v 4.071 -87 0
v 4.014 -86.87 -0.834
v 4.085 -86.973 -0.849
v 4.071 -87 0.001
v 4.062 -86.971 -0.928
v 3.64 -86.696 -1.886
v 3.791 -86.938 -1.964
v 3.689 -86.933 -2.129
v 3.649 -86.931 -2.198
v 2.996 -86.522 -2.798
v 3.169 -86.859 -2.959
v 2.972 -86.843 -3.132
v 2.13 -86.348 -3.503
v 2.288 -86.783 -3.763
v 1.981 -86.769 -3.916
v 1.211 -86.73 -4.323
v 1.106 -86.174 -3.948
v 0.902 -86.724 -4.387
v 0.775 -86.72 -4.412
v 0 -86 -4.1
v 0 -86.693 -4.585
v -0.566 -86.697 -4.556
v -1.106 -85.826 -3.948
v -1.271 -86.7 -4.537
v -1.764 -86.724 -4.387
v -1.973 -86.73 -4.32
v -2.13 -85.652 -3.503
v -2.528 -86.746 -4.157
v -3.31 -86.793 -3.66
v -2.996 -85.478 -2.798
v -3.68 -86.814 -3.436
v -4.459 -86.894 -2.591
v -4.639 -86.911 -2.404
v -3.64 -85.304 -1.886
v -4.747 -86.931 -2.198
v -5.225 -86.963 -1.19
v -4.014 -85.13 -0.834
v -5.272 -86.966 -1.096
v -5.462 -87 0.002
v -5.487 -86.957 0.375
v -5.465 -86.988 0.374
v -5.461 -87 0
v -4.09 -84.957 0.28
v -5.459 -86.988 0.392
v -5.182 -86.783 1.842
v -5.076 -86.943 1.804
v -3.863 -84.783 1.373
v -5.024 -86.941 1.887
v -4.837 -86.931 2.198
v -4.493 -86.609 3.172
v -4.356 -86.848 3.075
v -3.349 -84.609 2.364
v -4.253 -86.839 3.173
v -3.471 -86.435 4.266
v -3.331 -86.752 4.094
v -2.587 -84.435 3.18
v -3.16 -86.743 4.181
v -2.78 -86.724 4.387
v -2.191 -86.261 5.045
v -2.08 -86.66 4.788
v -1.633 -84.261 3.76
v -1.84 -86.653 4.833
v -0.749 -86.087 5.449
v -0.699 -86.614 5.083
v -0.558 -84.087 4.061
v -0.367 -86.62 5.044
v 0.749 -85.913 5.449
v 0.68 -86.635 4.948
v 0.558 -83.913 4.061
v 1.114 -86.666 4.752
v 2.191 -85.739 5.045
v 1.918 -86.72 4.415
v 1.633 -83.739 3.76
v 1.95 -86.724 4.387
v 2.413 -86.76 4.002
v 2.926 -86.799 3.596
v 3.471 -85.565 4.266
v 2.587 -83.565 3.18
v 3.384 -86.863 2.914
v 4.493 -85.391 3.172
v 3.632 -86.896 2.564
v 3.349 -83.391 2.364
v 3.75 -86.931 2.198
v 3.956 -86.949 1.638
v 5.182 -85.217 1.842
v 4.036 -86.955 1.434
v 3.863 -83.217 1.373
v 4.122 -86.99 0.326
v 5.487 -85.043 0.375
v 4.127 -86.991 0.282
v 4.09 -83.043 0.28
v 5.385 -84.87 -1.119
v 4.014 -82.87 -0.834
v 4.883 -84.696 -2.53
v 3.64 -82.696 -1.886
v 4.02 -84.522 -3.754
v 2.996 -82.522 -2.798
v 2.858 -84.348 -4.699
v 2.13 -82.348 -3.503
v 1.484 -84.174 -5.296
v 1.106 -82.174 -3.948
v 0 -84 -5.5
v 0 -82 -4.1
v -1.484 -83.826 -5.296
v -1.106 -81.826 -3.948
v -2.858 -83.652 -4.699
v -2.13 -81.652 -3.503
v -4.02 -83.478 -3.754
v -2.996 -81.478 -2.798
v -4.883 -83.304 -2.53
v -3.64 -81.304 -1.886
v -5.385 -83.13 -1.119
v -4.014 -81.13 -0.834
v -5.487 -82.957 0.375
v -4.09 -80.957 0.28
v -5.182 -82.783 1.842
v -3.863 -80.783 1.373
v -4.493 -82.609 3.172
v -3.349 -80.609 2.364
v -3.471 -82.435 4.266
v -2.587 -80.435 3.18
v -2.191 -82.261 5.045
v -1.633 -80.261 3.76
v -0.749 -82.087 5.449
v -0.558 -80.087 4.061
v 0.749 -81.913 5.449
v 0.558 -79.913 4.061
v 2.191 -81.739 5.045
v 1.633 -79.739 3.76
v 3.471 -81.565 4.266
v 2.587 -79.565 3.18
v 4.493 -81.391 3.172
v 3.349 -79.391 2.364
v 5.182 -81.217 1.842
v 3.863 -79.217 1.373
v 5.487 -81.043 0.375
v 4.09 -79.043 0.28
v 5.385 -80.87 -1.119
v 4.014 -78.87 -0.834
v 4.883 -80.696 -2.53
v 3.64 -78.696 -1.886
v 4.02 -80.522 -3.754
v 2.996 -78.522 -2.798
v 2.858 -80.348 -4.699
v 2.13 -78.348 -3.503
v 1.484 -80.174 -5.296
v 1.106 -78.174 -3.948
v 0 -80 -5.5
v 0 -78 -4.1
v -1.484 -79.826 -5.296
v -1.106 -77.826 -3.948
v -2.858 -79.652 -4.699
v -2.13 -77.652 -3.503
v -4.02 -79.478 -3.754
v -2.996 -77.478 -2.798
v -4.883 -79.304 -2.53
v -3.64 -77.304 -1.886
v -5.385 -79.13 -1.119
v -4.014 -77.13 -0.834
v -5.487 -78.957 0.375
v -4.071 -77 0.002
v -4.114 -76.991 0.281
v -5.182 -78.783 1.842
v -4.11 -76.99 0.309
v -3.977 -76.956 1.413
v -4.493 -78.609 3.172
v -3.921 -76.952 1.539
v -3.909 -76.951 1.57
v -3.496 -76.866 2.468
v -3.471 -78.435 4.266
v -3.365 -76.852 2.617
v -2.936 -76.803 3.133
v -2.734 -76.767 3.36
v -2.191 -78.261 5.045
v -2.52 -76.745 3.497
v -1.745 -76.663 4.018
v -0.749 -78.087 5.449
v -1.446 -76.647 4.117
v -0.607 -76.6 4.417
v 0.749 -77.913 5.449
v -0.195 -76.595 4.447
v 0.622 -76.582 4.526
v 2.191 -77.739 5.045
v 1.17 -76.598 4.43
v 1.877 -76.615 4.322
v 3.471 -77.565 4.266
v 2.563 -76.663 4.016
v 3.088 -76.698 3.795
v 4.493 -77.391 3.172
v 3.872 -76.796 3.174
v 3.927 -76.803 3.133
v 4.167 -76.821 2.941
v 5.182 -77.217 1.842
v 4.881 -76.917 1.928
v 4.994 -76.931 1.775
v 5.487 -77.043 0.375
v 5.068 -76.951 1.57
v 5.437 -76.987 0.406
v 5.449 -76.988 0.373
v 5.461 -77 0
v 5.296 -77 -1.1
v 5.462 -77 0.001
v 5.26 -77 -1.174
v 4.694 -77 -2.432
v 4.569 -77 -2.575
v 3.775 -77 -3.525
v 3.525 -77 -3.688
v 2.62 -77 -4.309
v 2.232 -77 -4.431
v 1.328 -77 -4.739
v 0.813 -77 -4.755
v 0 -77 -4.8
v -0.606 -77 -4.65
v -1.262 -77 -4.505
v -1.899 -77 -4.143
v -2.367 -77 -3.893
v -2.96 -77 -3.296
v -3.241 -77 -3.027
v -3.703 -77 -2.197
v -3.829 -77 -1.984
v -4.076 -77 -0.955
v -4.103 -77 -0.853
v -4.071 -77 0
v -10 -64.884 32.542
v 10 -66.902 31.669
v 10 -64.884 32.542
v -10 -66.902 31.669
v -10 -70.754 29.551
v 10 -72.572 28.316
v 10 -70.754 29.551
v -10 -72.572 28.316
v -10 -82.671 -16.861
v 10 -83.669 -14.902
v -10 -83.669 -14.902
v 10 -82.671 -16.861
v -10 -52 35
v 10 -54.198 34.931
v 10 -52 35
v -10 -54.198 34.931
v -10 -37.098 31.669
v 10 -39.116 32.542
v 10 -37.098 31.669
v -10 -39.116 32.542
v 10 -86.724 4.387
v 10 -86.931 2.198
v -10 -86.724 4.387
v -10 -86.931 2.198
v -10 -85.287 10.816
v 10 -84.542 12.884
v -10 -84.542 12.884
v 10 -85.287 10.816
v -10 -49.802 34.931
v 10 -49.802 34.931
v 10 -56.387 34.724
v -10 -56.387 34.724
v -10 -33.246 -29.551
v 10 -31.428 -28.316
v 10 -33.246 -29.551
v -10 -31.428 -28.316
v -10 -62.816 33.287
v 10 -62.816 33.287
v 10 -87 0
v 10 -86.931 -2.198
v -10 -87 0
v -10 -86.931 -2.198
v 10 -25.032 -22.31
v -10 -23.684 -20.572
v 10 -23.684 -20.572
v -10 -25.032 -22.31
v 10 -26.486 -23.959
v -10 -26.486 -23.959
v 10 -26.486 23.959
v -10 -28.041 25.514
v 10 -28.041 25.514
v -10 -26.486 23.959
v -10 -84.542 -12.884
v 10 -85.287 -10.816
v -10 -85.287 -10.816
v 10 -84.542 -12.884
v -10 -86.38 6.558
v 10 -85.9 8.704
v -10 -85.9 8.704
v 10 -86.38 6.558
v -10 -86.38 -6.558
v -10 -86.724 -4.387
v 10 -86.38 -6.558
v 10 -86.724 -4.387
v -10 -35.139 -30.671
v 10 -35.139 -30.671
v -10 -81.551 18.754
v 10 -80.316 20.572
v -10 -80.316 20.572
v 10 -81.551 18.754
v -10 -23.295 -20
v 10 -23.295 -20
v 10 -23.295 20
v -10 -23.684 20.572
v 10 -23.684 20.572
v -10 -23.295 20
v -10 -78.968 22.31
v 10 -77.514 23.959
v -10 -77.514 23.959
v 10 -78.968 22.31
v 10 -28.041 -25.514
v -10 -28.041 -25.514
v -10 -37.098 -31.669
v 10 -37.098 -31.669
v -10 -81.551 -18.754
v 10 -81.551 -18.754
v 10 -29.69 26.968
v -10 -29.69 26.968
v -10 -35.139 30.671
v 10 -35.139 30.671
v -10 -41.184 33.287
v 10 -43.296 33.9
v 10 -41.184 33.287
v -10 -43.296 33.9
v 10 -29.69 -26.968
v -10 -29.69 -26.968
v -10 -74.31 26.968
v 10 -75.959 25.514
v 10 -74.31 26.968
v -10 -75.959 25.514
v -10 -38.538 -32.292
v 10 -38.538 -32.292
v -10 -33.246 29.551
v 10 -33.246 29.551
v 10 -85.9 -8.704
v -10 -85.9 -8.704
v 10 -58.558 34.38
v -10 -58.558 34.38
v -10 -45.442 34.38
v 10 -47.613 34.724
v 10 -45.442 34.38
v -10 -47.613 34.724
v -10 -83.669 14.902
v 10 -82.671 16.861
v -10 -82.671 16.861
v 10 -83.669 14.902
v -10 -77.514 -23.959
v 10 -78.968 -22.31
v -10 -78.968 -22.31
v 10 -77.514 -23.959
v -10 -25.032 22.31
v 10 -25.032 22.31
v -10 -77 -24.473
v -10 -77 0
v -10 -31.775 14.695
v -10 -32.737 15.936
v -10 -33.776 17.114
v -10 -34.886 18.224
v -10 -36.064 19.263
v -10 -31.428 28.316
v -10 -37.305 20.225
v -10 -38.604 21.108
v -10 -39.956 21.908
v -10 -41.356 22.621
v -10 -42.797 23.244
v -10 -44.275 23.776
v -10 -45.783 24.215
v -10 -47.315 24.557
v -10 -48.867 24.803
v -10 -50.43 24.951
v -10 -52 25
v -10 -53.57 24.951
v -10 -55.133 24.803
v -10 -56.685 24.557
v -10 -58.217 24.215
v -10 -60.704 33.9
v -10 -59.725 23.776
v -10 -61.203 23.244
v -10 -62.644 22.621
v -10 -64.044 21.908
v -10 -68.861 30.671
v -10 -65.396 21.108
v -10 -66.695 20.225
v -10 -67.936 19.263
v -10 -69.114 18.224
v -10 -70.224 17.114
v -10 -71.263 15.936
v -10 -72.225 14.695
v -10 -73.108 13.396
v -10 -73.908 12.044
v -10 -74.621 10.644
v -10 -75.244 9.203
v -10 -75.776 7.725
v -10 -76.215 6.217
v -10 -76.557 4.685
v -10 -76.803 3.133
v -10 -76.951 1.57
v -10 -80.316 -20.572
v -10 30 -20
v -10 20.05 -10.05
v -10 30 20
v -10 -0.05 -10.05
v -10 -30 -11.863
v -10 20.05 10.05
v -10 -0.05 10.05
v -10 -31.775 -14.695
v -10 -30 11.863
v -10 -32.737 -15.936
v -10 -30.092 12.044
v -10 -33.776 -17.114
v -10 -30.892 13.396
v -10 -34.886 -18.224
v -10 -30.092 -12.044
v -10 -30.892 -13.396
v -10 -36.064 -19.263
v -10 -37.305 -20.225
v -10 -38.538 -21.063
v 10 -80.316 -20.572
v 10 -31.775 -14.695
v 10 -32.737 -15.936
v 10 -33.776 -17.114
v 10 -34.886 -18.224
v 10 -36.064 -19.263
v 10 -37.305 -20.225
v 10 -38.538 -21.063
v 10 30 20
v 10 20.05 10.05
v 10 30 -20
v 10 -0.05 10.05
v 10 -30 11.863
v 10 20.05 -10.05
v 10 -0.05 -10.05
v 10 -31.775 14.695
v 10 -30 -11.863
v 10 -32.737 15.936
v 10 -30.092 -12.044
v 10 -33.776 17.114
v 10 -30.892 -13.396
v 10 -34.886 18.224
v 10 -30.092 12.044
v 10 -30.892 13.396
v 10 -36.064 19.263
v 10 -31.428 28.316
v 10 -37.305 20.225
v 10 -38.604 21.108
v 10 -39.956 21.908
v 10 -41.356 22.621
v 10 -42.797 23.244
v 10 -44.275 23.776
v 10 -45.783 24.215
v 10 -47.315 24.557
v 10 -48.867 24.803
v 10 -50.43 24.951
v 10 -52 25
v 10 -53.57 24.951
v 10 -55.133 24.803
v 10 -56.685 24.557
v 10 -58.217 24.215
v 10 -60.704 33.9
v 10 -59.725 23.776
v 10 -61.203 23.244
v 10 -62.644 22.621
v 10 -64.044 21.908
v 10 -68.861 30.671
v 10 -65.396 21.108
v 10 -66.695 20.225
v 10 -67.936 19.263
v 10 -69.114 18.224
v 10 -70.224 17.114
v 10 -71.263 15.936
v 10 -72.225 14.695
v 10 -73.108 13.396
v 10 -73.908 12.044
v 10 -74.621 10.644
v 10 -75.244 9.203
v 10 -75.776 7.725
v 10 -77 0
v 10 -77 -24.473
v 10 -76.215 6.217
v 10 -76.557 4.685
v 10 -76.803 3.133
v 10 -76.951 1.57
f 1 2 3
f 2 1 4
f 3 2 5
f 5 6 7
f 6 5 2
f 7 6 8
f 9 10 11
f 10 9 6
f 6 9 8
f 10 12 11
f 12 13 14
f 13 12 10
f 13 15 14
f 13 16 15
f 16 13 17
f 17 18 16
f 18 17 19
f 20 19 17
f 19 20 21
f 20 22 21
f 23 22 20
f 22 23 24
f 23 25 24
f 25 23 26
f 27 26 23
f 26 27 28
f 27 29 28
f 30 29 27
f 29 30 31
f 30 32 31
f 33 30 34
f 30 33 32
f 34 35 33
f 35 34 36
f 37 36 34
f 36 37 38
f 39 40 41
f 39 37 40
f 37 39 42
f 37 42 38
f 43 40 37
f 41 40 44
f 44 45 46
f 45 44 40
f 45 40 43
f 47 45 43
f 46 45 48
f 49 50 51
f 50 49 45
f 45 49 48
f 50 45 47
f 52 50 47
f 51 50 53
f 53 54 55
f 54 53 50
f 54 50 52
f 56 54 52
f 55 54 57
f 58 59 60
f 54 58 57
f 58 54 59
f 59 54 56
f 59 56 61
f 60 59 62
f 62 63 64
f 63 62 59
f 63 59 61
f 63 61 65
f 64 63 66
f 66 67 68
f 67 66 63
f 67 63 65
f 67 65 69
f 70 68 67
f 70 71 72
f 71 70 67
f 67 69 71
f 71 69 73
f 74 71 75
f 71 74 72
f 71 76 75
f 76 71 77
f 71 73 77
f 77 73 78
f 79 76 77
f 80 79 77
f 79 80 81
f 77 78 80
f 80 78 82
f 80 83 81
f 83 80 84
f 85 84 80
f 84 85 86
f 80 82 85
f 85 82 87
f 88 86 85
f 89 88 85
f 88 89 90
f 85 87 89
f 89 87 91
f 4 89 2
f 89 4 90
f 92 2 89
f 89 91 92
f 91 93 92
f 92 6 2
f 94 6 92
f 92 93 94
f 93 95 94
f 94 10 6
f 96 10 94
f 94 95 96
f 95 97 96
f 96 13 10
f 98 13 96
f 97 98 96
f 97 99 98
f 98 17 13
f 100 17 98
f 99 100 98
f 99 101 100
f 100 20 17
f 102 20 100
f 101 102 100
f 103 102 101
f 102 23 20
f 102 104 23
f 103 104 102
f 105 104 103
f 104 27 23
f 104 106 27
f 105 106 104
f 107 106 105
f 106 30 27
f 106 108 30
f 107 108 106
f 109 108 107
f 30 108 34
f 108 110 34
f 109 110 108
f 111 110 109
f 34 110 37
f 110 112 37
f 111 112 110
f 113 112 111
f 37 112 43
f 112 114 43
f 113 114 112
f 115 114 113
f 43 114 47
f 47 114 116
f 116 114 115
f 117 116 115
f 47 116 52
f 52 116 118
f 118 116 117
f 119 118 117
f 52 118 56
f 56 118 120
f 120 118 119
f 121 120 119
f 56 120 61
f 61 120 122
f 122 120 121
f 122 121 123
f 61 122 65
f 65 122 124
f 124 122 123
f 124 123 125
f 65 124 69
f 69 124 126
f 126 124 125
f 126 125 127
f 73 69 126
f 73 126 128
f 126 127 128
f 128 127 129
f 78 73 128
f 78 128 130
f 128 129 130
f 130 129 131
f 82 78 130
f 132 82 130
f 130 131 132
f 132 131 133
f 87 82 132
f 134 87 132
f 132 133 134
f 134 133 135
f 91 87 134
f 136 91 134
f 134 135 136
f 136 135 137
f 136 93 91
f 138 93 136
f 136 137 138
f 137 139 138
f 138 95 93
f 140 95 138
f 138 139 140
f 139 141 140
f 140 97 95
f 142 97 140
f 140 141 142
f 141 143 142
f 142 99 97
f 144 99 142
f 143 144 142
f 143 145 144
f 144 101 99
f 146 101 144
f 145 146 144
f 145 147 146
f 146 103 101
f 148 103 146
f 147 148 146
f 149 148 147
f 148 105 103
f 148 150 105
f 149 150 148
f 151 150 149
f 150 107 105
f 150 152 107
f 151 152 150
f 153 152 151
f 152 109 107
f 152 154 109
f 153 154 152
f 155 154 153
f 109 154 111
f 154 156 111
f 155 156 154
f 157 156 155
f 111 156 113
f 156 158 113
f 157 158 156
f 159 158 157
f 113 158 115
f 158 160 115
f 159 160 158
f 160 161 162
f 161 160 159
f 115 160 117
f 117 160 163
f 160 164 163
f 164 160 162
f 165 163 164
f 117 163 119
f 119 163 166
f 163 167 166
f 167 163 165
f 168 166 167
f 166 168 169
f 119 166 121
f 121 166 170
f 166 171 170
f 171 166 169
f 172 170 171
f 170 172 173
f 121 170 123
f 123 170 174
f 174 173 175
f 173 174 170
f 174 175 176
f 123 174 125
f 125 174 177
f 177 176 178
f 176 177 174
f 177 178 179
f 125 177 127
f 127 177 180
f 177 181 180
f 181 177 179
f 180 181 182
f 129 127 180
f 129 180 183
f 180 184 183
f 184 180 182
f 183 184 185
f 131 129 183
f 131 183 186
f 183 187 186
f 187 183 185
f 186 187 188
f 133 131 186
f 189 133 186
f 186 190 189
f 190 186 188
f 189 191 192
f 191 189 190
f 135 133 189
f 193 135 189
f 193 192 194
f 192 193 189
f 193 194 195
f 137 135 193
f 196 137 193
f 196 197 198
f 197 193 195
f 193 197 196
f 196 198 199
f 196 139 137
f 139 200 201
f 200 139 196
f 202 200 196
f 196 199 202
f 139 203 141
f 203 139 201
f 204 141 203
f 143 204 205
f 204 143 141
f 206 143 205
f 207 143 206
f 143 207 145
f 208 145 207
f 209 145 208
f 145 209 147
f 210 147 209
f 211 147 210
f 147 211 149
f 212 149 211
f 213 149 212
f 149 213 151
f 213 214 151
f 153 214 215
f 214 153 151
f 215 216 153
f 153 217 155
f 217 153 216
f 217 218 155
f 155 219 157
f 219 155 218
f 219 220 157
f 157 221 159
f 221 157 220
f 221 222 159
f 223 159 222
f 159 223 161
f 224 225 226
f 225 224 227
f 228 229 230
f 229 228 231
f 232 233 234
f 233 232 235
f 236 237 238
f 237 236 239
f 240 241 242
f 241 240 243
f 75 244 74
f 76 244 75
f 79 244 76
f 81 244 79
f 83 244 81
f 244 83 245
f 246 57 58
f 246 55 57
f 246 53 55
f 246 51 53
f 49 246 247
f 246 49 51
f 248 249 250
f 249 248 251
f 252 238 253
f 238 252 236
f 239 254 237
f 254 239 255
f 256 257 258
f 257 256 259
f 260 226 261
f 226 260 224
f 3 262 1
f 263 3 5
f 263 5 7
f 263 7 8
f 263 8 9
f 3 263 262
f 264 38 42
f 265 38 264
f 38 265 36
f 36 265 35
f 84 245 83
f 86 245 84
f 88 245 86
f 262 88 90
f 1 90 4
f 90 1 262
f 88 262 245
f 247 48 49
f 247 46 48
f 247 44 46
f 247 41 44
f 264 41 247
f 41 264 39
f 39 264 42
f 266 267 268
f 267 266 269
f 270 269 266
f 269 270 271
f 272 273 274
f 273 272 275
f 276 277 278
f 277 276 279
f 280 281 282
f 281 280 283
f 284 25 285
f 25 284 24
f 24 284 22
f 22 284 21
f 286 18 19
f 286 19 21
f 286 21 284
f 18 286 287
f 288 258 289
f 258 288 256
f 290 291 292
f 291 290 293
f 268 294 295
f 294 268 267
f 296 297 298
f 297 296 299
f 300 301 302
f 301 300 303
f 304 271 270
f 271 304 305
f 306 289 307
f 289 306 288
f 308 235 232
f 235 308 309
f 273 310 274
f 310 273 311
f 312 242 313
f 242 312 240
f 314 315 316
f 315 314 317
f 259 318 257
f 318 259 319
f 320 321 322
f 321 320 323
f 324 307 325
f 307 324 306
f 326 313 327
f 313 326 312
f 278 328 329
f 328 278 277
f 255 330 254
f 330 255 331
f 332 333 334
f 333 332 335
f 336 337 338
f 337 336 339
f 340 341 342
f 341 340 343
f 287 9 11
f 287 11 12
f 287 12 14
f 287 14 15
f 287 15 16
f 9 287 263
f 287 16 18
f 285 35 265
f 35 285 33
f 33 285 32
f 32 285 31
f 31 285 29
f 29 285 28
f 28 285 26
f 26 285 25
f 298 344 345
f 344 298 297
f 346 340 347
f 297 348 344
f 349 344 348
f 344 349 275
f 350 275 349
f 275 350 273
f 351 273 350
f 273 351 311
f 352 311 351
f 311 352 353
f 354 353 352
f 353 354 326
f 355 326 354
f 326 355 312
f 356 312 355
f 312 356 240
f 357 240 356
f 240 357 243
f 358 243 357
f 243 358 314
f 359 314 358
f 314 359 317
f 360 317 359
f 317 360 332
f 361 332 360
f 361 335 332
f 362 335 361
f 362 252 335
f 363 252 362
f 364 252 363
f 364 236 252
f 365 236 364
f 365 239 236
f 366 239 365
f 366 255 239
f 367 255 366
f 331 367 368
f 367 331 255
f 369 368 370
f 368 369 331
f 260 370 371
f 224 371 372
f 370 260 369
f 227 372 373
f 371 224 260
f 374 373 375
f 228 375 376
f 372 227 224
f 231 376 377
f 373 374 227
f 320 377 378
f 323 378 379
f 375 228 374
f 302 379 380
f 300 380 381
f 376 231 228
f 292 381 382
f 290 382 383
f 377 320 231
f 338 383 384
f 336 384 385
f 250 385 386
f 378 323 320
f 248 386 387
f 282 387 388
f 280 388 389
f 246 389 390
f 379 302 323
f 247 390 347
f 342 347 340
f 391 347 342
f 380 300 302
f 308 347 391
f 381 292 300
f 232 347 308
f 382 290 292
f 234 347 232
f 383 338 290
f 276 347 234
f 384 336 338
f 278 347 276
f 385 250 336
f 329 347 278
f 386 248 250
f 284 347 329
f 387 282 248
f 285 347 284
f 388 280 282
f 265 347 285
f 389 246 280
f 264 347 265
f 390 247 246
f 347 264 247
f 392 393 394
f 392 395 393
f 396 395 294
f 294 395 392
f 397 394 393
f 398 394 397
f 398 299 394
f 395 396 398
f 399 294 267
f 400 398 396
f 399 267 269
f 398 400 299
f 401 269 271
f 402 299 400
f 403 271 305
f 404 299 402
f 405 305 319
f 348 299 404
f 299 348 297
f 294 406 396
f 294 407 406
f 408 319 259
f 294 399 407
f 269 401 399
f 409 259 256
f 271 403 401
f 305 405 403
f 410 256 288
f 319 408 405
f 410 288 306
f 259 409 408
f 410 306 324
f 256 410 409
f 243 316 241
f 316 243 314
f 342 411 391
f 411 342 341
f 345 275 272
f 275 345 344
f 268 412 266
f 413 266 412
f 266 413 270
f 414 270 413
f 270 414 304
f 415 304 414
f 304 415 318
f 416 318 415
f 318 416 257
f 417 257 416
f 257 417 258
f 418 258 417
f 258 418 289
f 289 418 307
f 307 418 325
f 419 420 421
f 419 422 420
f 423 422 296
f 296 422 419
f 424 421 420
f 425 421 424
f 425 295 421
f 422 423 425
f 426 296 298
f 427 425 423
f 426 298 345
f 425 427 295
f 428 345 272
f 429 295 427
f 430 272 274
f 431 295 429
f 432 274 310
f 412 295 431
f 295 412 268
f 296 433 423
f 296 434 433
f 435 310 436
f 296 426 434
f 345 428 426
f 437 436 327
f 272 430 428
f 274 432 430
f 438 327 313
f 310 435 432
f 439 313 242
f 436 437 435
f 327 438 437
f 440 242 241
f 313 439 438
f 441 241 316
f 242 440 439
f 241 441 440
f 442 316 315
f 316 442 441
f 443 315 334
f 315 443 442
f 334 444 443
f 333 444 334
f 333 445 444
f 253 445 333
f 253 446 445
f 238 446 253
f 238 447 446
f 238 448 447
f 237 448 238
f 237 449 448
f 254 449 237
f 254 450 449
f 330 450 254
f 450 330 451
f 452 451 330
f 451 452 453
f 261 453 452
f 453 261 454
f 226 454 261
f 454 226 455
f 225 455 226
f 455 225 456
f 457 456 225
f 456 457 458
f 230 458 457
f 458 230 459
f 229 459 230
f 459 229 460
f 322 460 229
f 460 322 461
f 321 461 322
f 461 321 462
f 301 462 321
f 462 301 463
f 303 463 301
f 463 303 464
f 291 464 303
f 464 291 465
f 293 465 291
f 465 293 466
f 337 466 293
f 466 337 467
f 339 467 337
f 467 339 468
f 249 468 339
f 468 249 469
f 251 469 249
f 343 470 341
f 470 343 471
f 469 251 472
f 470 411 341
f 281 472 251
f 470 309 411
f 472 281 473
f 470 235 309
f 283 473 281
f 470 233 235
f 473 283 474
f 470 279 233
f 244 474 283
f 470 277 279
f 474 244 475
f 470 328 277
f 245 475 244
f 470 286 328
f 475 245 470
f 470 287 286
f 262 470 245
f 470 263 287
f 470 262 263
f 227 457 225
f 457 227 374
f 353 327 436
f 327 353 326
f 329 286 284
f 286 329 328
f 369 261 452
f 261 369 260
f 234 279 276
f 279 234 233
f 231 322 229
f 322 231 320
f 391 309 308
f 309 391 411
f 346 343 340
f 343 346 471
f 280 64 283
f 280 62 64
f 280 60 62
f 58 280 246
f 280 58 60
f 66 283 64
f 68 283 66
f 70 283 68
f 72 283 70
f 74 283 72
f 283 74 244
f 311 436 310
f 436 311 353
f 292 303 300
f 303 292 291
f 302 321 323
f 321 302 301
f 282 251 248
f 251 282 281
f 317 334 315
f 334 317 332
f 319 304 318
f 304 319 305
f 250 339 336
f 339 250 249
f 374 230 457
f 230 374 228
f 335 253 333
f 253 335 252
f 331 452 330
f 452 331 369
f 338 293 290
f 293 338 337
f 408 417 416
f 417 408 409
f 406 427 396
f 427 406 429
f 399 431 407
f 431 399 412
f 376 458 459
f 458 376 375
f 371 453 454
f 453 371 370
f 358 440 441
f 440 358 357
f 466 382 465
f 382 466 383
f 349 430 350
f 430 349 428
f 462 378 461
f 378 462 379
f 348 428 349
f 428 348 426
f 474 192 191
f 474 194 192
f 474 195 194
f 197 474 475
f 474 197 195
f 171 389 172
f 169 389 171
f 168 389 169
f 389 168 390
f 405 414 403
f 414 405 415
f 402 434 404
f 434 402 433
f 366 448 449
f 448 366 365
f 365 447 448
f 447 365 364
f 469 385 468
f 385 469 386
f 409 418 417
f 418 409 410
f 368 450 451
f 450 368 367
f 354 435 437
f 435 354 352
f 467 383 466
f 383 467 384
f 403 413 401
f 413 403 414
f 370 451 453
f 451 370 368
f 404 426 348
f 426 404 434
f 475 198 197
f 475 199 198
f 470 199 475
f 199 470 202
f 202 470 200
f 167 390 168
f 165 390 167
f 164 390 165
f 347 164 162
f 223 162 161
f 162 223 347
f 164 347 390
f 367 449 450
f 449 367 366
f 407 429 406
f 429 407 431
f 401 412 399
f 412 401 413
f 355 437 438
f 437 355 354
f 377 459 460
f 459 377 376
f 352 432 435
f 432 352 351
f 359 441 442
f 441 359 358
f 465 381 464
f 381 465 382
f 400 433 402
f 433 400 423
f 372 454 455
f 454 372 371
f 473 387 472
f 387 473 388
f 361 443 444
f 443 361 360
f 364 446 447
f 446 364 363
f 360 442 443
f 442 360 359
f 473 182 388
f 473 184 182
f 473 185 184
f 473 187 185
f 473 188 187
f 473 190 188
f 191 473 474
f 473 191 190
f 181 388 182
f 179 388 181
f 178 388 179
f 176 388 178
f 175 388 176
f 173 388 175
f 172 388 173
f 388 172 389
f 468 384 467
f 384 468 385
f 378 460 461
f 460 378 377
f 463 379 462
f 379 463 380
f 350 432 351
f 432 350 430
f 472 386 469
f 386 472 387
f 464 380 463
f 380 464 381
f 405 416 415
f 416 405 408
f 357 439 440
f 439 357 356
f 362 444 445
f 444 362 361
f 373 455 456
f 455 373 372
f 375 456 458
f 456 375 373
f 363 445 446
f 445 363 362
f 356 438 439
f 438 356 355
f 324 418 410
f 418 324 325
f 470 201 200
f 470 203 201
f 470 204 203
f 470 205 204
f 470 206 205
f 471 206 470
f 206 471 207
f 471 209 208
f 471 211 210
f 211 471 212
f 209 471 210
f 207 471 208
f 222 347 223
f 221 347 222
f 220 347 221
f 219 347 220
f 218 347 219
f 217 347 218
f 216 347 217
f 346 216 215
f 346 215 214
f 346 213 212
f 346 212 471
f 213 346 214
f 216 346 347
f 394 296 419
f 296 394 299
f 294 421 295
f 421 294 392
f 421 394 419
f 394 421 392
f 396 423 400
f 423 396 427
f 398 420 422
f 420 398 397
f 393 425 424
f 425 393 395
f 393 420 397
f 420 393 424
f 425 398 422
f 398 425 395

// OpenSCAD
// file: nutsnbolts/data-access.scad
// Norm Nuts and Bolts - a OpenSCAD library
// Copyright (C) 2012  Johannes Kneer

// This program is free software: you can redistribute it and/or modify
// it under the terms of the GNU General Public License as published by
// the Free Software Foundation, either version 3 of the License, or
// (at your option) any later version.

// This program is distributed in the hope that it will be useful,
// but WITHOUT ANY WARRANTY; without even the implied warranty of
// MERCHANTABILITY or FITNESS FOR A PARTICULAR PURPOSE.  See the
// GNU General Public License for more details.

// You should have received a copy of the GNU General Public License
// along with this program.  If not, see <http://www.gnu.org/licenses/>.


// DATABASE ACCESS FUNCTIONS AND CONSTANTS



// == CONSTANTS ==

// screw table access keys
_NB_S_DESC            = 0;
_NB_S_FAMKEY			    = 1;
_NB_S_LENGTH          = 2;
_NB_S_NOTHREAD_LENGTH = 3;

_NB_F_DESC			      = 0;
_NB_F_OUTER_DIA       = 1;
_NB_F_INNER_DIA       = 2;
_NB_F_LEAD            = 3;
_NB_F_KEY             = 4;
_NB_F_KEY_DEPTH       = 5;
_NB_F_HEAD_HEIGHT     = 6;
_NB_F_HEAD_DIA        = 7;
_NB_F_NUT_KEY         = 8;
_NB_F_NUT_HEIGHT      = 9;
_NB_F_PITCH_FINE      = 10;
_NB_F_PITCH_MEDIUM    = 11;
_NB_F_PITCH_COARSE    = 12;


// == FUNCTIONS ==

// _get_screw("descriptor")   with descriptor = M8x25
//   find the line for a general object in the data matrix

function _get_screw(n) = data_screw[search([n], data_screw)[0]];
function _get_screw_fam(n) = data_screw_fam[search([_get_screw(n)[_NB_S_FAMKEY]], data_screw_fam)[0]];

function _get_fam(n) = data_screw_fam[search([n], data_screw_fam)[0]];


// _get_XXXXX("descriptor") functions
// find a single property in the database

function _get_desc(n)        = _get_screw(n)[_NB_S_DESC];
function _get_famkey(n)         = _get_screw(n)[_NB_S_FAMKEY];
function _get_length(n)      = _get_screw(n)[_NB_S_LENGTH];
function _get_nt_length(n)   = _get_screw(n)[_NB_S_NOTHREAD_LENGTH];

function _get_outer_dia(n)   = _get_screw_fam(n)[_NB_F_OUTER_DIA];
function _get_inner_dia(n)   = _get_screw_fam(n)[_NB_F_INNER_DIA];
function _get_lead(n)        = _get_screw_fam(n)[_NB_F_LEAD];
function _get_head_height(n) = _get_screw_fam(n)[_NB_F_HEAD_HEIGHT];
function _get_head_dia(n)    = _get_screw_fam(n)[_NB_F_HEAD_DIA];
function _get_nut_key(n)     = _get_screw_fam(n)[_NB_F_NUT_KEY];
function _get_nut_height(n)  = _get_screw_fam(n)[_NB_F_NUT_HEIGHT];
function _get_fine_pitch(n)  = _get_screw_fam(n)[_NB_F_PITCH_FINE];
function _get_medium_pitch(n)  = _get_screw_fam(n)[_NB_F_PITCH_MEDIUM];
function _get_coarse_pitch(n)  = _get_screw_fam(n)[_NB_F_PITCH_COARSE];
// file: polyScrewThread_r1.scad
/*
 *    polyScrewThread_r1.scad    by aubenc @ Thingiverse
 *
 * This script contains the library modules that can be used to generate
 * threaded rods, screws and nuts.
 *
 * http://www.thingiverse.com/thing:8796
 *
 * CC Public Domain
 */

module screw_thread(od,st,lf0,lt,rs,cs)
{
    or=od/2;
    ir=or-st/2*cos(lf0)/sin(lf0);
    pf=2*PI*or;
    sn=floor(pf/rs);
    lfxy=360/sn;
    ttn=round(lt/st+1);
    zt=st/sn;

    intersection()
    {
        if (cs >= -1)
        {
           thread_shape(cs,lt,or,ir,sn,st);
        }

        full_thread(ttn,st,sn,zt,lfxy,or,ir);
    }
}

module hex_nut(df,hg,sth,clf,cod,crs)
{

    difference()
    {
        hex_head(hg,df);

        hex_countersink_ends(sth/2,cod,clf,crs,hg);

        screw_thread(cod,sth,clf,hg,crs,-2);
    }
}


module hex_screw(od,st,lf0,lt,rs,cs,df,hg,ntl,ntd)
{
    ntr=od/2-(st/2)*cos(lf0)/sin(lf0);

    union()
    {
        hex_head(hg,df);

        translate([0,0,hg])
        if ( ntl == 0 )
        {
            cylinder(h=0.01, r=ntr, center=true);
        }
        else
        {
            if ( ntd == -1 )
            {
                cylinder(h=ntl+0.01, r=ntr, $fn=floor(od*PI/rs), center=false);
            }
            else if ( ntd == 0 )
            {
                union()
                {
                    cylinder(h=ntl-st/2,
                             r=od/2, $fn=floor(od*PI/rs), center=false);

                    translate([0,0,ntl-st/2])
                    cylinder(h=st/2,
                             r1=od/2, r2=ntr, 
                             $fn=floor(od*PI/rs), center=false);
                }
            }
            else
            {
                cylinder(h=ntl, r=ntd/2, $fn=ntd*PI/rs, center=false);
            }
        }

        translate([0,0,ntl+hg]) screw_thread(od,st,lf0,lt,rs,cs);
    }
}

module hex_screw_0(od,st,lf0,lt,rs,cs,df,hg,ntl,ntd)
{
    ntr=od/2-(st/2)*cos(lf0)/sin(lf0);

    union()
    {
        hex_head_0(hg,df);

        translate([0,0,hg])
        if ( ntl == 0 )
        {
            cylinder(h=0.01, r=ntr, center=true);
        }
        else
        {
            if ( ntd == -1 )
            {
                cylinder(h=ntl+0.01, r=ntr, $fn=floor(od*PI/rs), center=false);
            }
            else if ( ntd == 0 )
            {
                union()
                {
                    cylinder(h=ntl-st/2,
                             r=od/2, $fn=floor(od*PI/rs), center=false);

                    translate([0,0,ntl-st/2])
                    cylinder(h=st/2,
                             r1=od/2, r2=ntr, 
                             $fn=floor(od*PI/rs), center=false);
                }
            }
            else
            {
                cylinder(h=ntl, r=ntd/2, $fn=ntd*PI/rs, center=false);
            }
        }

        translate([0,0,ntl+hg]) screw_thread(od,st,lf0,lt,rs,cs);
    }
}

module thread_shape(cs,lt,or,ir,sn,st)
{
    if ( cs == 0 )
    {
        cylinder(h=lt, r=or, $fn=sn, center=false);
    }
    else
    {
        union()
        {
            translate([0,0,st/2])
              cylinder(h=lt-st+0.005, r=or, $fn=sn, center=false);

            if ( cs == -1 || cs == 2 )
            {
                cylinder(h=st/2, r1=ir, r2=or, $fn=sn, center=false);
            }
            else
            {
                cylinder(h=st/2, r=or, $fn=sn, center=false);
            }

            translate([0,0,lt-st/2])
            if ( cs == 1 || cs == 2 )
            {
                  cylinder(h=st/2, r1=or, r2=ir, $fn=sn, center=false);
            }
            else
            {
                cylinder(h=st/2, r=or, $fn=sn, center=false);
            }
        }
    }
}

module full_thread(ttn,st,sn,zt,lfxy,or,ir)
{
  if(ir >= 0.2)
  {
    for(i=[0:ttn-1])
    {
        for(j=[0:sn-1])
			assign( pt = [	[0,                  0,                  i*st-st            ],
                        [ir*cos(j*lfxy),     ir*sin(j*lfxy),     i*st+j*zt-st       ],
                        [ir*cos((j+1)*lfxy), ir*sin((j+1)*lfxy), i*st+(j+1)*zt-st   ],
								[0,0,i*st],
                        [or*cos(j*lfxy),     or*sin(j*lfxy),     i*st+j*zt-st/2     ],
                        [or*cos((j+1)*lfxy), or*sin((j+1)*lfxy), i*st+(j+1)*zt-st/2 ],
                        [ir*cos(j*lfxy),     ir*sin(j*lfxy),     i*st+j*zt          ],
                        [ir*cos((j+1)*lfxy), ir*sin((j+1)*lfxy), i*st+(j+1)*zt      ],
                        [0,                  0,                  i*st+st            ]	])
        {
            polyhedron(points=pt,
              		  triangles=[	[1,0,3],[1,3,6],[6,3,8],[1,6,4],
											[0,1,2],[1,4,2],[2,4,5],[5,4,6],[5,6,7],[7,6,8],
											[7,8,3],[0,2,3],[3,2,7],[7,2,5]	]);
        }
    }
  }
  else
  {
    echo("Step Degrees too agresive, the thread will not be made!!");
    echo("Try to increase de value for the degrees and/or...");
    echo(" decrease the pitch value and/or...");
    echo(" increase the outer diameter value.");
  }
}

module hex_head(hg,df)
{
	rd0=df/2/sin(60);
	x0=0;	x1=df/2;	x2=x1+hg/2;
	y0=0;	y1=hg/2;	y2=hg;

	intersection()
	{
	   cylinder(h=hg, r=rd0, $fn=6, center=false);

		rotate_extrude(convexity=10, $fn=6*round(df*PI/6/0.5))
		polygon([ [x0,y0],[x1,y0],[x2,y1],[x1,y2],[x0,y2] ]);
	}
}

module hex_head_0(hg,df)
{
    cylinder(h=hg, r=df/2/sin(60), $fn=6, center=false);
}

module hex_countersink_ends(chg,cod,clf,crs,hg)
{
    translate([0,0,-0.1])
    cylinder(h=chg+0.01, 
             r1=cod/2, 
             r2=cod/2-(chg+0.1)*cos(clf)/sin(clf),
             $fn=floor(cod*PI/crs), center=false);

    translate([0,0,hg-chg+0.1])
    cylinder(h=chg+0.01, 
             r1=cod/2-(chg+0.1)*cos(clf)/sin(clf),
             r2=cod/2, 
             $fn=floor(cod*PI/crs), center=false);
}
// file: utils.scad
include <settings.scad>
include <polyScrewThread_r1.scad>

module screw(diameter) {
       hex_screw(diameter,4,55,100,1.5,2,24,8,0,0);
 
}

module big_screw() {
       hex_screw(11,4,55,40,1.5,2,24,8,0,0);
 
       
}

module medium_screw() {
       screw(8);
}
// file: settings.scad
//// Parametrics settings

RingNumberOfTeeth=100;
DriverNumberOfTeeth=6;

ClampThickness=20;
ClampDiameter=50; // C172 is 19mm 
ClampLength=30;
ClampZone=20;

GrooveWidth=5;

fn=100;


RingThickness = 20; 
RingDiameter=140;

Tolerance=0.1;
// main file
include <settings.scad>
include <utils.scad>

include <nutsnbolts/cyl_head_bolt.scad>


module attachment() {
    //translate([0,-100, 0]) rotate([-90, 0, 0]) big_screw();
    translate([-ClampThickness/2, -52, 0]) {
        rotate([0, 90, 0]) {
            difference(){
                cylinder(ClampThickness, ClampDiameter/2+ClampThickness/2, ClampDiameter/2+ClampThickness/2, $fn=fn);
                cylinder(ClampThickness, ClampDiameter/2, ClampDiameter/2, $fn=fn);
                translate([0, -ClampDiameter/2, 0]) cube([ClampDiameter, ClampDiameter / 1.3, ClampThickness]);
                translate([0, -50, ClampThickness/2]) rotate([-90, 0, 0]) big_screw();
            } ;
        }   
    }; 
    difference() {
        cube([ClampThickness, ClampThickness * 3, ClampThickness * 2], center=true);
    //     cube([ClampThickness, ClampThickness, ClampThickness]);
         translate([0, 10, 0]){
             cube([2*ClampThickness, ClampThickness+Tolerance, ClampThickness+Tolerance], center=true);
         }
    }
   
}

attachment();
